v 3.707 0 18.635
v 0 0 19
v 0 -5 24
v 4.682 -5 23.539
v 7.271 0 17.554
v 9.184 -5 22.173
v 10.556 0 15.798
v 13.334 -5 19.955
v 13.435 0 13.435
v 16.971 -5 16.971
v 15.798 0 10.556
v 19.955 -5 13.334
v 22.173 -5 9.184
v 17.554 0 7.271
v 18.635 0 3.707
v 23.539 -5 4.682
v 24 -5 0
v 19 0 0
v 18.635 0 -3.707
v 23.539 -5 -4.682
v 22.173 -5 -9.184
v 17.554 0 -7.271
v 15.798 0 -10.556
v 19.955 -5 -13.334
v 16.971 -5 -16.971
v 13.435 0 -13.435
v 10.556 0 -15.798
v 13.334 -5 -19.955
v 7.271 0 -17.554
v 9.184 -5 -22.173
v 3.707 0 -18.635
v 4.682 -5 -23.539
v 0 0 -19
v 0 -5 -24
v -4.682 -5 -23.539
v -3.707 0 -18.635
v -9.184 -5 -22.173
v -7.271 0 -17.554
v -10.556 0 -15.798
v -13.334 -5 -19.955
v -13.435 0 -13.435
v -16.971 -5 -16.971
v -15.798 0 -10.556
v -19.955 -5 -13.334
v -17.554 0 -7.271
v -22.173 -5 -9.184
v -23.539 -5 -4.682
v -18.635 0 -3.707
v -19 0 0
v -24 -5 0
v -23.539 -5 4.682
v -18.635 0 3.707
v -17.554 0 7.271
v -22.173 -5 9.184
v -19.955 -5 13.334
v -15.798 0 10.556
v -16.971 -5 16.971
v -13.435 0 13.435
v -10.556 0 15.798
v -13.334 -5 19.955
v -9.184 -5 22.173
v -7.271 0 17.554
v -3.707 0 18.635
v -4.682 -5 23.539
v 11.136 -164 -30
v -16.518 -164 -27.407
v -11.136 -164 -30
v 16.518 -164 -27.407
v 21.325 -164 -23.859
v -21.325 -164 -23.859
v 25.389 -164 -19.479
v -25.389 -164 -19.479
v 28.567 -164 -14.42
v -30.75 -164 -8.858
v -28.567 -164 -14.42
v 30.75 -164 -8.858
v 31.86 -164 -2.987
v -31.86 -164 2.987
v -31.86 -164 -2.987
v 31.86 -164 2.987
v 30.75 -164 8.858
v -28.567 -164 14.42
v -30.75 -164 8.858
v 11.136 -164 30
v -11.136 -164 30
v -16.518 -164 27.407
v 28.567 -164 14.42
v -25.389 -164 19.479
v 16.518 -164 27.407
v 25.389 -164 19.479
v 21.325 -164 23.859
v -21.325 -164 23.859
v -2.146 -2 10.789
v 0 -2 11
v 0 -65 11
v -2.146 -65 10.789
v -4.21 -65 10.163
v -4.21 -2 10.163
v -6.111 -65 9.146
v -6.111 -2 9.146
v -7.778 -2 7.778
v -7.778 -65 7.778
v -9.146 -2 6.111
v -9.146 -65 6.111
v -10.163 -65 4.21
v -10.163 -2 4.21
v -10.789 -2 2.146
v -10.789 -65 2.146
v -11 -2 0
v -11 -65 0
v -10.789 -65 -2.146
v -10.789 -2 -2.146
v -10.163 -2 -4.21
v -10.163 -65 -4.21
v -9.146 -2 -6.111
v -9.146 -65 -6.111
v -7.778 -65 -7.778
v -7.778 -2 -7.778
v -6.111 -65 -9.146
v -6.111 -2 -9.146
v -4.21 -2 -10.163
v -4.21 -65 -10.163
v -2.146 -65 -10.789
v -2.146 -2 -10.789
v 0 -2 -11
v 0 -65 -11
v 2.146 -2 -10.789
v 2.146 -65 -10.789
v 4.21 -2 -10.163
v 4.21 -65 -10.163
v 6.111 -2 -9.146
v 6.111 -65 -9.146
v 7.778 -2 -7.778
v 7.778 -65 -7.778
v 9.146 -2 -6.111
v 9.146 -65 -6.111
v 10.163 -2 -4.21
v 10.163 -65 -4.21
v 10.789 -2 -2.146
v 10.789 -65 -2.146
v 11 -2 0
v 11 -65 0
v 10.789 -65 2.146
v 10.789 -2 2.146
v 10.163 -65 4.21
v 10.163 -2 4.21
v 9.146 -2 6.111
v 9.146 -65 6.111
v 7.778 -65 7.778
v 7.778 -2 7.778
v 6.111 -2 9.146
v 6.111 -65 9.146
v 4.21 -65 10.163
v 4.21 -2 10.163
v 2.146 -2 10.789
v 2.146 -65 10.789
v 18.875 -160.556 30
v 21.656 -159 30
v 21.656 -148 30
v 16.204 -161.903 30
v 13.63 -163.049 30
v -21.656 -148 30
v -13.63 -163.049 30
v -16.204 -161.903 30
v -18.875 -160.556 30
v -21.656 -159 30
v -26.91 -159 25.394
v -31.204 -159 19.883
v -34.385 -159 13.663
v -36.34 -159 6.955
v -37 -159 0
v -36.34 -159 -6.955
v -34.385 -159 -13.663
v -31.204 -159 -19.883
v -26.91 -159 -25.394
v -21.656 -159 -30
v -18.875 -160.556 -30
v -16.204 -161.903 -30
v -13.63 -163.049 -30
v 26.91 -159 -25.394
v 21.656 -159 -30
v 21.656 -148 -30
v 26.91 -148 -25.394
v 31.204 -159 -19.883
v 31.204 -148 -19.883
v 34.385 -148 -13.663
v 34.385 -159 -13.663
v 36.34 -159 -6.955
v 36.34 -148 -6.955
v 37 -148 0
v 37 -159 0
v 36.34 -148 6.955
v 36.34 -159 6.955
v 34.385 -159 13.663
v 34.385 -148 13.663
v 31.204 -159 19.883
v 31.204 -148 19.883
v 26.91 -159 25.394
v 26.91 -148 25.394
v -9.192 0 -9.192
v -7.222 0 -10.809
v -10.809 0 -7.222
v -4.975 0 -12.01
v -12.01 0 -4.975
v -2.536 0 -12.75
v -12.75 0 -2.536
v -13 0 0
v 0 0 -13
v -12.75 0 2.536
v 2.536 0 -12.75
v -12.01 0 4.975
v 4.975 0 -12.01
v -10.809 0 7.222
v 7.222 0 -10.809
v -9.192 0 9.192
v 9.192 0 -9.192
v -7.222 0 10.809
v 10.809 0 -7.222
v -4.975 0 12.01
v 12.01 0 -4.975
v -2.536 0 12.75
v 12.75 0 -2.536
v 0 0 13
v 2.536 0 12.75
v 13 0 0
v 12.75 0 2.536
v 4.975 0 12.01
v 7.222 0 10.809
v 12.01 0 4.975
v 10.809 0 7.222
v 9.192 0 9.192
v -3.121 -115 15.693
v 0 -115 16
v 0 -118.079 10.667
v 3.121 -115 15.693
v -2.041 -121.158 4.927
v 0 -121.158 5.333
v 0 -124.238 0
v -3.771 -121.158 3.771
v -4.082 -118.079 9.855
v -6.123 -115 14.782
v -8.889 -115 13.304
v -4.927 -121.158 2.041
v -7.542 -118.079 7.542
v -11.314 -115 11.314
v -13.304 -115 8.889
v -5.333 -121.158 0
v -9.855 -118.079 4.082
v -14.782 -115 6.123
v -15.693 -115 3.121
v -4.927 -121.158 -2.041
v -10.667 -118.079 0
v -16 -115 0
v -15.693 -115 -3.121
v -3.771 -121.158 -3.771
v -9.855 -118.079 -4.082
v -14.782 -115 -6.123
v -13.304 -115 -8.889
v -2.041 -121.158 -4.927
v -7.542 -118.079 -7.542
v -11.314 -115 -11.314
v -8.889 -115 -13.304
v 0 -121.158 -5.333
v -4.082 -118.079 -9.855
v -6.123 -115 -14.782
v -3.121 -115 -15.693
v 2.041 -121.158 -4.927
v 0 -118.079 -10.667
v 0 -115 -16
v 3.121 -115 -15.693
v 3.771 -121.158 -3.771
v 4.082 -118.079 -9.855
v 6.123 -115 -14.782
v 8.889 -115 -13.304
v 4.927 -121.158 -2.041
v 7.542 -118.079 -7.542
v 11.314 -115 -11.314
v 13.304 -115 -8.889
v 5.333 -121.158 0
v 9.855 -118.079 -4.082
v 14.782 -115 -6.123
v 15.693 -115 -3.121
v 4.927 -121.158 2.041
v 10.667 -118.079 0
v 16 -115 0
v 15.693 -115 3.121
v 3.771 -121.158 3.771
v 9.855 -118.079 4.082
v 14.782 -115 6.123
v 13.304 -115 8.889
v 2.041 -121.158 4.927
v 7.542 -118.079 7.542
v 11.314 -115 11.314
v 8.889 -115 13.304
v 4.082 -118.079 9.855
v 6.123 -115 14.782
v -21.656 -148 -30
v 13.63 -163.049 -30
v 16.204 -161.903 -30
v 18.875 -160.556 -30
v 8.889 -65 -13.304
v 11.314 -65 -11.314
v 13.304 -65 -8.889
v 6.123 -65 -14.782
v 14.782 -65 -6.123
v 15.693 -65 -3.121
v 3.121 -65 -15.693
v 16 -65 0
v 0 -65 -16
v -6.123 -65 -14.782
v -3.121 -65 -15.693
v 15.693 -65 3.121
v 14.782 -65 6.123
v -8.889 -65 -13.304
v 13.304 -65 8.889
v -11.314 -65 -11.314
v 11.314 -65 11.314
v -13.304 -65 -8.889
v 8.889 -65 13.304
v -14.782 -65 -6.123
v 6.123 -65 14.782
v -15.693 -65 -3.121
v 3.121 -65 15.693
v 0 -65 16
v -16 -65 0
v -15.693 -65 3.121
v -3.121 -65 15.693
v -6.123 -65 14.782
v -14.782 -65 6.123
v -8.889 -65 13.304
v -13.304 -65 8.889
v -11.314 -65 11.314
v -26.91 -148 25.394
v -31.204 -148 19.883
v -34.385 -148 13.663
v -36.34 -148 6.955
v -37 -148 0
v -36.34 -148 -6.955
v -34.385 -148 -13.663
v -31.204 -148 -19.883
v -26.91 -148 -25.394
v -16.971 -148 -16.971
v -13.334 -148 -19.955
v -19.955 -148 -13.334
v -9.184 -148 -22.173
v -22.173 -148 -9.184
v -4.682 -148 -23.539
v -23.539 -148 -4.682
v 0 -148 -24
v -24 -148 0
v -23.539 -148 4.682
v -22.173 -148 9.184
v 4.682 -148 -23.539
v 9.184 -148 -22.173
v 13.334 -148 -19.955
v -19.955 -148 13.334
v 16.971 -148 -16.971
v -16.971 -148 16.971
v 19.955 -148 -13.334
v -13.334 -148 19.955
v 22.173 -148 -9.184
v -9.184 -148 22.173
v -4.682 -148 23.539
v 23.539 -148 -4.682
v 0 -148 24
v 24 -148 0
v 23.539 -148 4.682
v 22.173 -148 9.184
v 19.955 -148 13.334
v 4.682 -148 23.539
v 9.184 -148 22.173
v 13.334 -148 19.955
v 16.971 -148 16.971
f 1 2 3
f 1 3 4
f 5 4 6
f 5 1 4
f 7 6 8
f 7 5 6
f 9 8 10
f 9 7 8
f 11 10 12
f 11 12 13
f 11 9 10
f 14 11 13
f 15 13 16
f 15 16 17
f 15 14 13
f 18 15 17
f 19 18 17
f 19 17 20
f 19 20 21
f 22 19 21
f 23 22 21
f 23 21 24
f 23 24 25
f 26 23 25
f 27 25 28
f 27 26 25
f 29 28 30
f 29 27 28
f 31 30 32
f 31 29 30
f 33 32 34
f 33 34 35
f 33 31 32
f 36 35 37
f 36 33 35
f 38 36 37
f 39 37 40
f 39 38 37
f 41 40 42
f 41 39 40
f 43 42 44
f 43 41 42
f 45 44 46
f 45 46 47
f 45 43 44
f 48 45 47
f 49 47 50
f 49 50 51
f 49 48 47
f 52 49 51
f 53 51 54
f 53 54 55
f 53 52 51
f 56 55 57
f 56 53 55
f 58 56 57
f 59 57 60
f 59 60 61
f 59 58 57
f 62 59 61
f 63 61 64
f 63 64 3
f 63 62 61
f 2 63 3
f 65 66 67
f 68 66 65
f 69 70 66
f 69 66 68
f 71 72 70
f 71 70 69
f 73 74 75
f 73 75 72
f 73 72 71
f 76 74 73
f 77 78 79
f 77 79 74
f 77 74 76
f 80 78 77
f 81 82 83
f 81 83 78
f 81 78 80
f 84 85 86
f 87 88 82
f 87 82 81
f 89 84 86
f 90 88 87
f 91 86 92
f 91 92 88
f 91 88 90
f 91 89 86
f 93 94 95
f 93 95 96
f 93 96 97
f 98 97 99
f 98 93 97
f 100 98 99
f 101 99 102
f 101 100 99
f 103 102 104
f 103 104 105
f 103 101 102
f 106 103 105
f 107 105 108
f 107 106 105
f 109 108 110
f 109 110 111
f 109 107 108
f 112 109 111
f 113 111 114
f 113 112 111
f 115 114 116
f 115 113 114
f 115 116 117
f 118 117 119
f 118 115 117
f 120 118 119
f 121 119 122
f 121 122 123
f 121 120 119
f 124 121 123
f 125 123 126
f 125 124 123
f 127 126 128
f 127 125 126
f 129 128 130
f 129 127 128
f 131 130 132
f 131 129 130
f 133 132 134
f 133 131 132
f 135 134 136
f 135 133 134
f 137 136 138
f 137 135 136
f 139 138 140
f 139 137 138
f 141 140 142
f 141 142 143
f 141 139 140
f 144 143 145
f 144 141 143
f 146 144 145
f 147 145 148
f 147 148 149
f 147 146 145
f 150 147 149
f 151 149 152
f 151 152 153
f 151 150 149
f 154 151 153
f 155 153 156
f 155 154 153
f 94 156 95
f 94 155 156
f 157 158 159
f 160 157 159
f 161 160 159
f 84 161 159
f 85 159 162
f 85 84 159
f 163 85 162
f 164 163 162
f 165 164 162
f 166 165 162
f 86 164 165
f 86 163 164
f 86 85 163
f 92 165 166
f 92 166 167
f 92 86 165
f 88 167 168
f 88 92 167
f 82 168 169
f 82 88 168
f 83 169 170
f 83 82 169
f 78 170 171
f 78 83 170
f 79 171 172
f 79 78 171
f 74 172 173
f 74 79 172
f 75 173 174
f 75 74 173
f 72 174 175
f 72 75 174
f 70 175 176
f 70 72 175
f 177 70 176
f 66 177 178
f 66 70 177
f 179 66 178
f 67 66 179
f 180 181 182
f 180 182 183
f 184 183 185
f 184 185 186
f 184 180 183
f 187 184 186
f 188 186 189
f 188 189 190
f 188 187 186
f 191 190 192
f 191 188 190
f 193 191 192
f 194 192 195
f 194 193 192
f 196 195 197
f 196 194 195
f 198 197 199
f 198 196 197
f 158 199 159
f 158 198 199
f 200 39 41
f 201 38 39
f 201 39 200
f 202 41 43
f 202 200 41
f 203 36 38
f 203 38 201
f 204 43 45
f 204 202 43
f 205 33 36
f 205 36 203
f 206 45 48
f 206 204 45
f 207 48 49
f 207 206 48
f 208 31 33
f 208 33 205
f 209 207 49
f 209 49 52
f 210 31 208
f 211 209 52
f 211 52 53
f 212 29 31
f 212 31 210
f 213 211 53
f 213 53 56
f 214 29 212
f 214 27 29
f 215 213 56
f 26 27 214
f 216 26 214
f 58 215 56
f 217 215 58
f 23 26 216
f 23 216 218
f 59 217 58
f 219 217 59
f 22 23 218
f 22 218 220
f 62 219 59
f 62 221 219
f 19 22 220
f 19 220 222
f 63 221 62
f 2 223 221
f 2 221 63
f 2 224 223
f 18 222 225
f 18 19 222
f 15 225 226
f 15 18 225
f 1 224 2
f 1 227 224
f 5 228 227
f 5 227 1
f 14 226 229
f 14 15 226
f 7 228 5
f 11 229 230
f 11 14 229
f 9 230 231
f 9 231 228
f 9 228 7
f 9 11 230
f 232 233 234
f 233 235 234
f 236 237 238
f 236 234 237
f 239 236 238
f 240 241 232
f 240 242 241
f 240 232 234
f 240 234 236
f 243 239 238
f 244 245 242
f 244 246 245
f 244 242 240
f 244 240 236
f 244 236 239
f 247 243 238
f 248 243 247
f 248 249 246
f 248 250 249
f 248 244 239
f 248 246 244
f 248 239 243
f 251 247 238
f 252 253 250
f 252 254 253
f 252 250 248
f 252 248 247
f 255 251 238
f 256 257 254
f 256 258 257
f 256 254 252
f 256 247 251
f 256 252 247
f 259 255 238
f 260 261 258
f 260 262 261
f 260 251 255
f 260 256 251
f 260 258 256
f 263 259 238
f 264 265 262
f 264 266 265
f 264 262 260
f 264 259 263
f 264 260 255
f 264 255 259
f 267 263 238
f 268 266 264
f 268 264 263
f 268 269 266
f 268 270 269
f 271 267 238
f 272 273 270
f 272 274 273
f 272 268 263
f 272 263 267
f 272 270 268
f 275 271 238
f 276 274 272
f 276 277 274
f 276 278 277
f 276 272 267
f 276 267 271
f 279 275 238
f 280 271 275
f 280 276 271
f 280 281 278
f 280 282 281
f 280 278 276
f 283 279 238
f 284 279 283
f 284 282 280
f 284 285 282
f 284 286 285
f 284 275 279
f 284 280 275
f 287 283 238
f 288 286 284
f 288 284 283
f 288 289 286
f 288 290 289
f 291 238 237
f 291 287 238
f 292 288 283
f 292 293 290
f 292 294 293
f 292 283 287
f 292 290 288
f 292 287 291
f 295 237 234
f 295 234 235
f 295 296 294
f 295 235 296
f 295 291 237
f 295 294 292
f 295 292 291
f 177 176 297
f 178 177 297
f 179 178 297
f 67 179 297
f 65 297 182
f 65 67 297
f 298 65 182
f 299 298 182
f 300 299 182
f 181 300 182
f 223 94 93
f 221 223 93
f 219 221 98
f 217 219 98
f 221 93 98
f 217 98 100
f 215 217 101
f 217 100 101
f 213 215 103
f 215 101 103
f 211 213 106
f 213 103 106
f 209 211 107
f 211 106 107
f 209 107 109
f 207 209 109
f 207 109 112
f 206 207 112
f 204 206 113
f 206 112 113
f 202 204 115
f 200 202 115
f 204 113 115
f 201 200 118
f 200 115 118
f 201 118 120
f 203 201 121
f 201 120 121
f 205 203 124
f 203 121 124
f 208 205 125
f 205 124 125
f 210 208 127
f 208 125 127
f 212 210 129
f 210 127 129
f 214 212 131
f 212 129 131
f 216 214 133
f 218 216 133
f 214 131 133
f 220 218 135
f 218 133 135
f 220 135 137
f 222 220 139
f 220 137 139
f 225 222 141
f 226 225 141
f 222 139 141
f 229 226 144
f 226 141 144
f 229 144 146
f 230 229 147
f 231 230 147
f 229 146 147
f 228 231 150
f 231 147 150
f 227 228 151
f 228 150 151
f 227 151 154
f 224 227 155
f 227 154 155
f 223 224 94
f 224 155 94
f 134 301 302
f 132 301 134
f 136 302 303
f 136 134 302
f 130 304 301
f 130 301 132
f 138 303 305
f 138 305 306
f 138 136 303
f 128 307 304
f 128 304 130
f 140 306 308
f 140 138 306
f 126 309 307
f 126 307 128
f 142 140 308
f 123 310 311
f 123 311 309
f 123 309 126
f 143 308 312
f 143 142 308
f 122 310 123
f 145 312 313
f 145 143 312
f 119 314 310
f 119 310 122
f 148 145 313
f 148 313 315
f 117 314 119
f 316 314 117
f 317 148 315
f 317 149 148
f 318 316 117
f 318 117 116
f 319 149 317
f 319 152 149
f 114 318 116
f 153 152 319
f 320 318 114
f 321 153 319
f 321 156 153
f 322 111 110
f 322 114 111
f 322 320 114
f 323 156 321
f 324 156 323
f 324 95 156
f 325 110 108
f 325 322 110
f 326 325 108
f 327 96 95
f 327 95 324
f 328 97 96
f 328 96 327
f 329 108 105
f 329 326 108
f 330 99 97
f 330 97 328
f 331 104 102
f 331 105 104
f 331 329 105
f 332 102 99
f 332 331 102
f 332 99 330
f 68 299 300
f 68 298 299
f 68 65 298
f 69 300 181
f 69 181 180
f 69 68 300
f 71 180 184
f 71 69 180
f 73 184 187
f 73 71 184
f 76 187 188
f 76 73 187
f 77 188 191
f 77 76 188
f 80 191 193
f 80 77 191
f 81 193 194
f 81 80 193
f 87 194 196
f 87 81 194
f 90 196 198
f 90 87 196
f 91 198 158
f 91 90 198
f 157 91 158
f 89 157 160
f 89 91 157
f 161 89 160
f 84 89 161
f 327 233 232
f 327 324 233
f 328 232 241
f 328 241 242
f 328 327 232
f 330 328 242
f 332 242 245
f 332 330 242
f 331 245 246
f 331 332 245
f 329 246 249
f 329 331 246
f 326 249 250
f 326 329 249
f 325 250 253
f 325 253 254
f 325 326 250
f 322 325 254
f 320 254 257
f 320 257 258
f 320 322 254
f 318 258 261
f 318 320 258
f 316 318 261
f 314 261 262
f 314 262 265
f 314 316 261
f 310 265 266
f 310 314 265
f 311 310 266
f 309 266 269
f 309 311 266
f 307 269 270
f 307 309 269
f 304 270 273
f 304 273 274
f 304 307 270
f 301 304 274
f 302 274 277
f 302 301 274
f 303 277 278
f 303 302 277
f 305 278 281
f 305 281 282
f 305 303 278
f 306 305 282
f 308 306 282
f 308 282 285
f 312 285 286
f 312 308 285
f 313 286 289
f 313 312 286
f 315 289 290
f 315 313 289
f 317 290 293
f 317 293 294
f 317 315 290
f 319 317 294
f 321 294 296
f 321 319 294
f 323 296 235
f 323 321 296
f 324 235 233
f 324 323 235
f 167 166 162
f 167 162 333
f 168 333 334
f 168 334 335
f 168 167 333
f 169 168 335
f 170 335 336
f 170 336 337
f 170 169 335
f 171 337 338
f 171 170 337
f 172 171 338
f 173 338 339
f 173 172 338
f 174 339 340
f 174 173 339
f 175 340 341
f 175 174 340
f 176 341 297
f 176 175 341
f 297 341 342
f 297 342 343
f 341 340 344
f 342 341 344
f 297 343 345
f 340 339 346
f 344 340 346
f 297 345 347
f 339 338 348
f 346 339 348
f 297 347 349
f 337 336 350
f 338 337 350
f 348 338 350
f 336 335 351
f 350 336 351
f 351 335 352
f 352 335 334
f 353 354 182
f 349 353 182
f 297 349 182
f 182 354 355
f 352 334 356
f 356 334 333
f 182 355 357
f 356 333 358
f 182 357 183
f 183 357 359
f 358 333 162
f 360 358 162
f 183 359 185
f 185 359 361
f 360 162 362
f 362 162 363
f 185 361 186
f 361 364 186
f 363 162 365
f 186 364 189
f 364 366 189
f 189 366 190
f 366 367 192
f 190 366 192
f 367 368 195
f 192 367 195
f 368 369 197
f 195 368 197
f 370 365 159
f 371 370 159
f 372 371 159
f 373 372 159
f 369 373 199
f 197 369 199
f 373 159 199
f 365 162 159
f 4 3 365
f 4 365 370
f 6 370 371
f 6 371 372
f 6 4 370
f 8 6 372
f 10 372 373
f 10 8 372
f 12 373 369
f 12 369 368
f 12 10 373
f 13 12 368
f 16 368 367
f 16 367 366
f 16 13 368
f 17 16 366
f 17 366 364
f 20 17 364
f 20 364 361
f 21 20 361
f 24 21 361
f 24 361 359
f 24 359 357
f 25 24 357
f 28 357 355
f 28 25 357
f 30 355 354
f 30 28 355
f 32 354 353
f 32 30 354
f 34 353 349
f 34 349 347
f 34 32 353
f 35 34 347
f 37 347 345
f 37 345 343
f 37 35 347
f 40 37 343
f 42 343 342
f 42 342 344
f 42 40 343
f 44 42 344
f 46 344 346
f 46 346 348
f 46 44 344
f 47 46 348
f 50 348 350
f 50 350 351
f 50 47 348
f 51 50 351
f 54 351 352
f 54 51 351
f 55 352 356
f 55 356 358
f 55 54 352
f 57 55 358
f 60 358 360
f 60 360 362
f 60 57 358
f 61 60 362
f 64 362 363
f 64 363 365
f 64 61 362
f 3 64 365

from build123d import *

# Parameters (mm, degrees)
EXTRUDE_1_DEPTH = 16
SKETCH_2_W      = 24
SKETCH_2_H      = 148
CHAMFER_1_SIZE  = 5
CHAMFER_2_SIZE  = 2


with BuildPart() as part:
    # Эскиз1 → Бобышка-Вытянуть1 (new body)
    with BuildSketch(Plane.XZ.offset(164)):
        with BuildLine():
            Line((21.656407828, 30), (-21.656407828, 30))
            ThreePointArc((-21.656407828, 30), (-37, 0), (-21.656407828, -30))
            Line((-21.656407828, -30), (21.656407828, -30))
            ThreePointArc((21.656407828, -30), (37, 0), (21.656407828, 30))
        make_face()
    extrude(amount=-EXTRUDE_1_DEPTH)

    # Эскиз2 → Повернуть1 (revolve)
    with BuildSketch(Plane(origin=(0, 0, 0), x_dir=(-1, 0, 0), z_dir=(0, 0, -1)), mode=Mode.PRIVATE) as revolve_1_sk:
        with Locations((-12, -74)):
            Rectangle(SKETCH_2_W, SKETCH_2_H)
    revolve(revolve_1_sk.sketch.rotate(Axis((0, -148, 0), (0, 1, 0)), 270), axis=Axis((0, -148, 0), (0, 1, 0)))

    # Эскиз3 → Цековка для  болта с шестигранной головкой M301 (revolve, cut)
    with BuildSketch(Plane(origin=(0, 0, 0), x_dir=(0, 0, 1), z_dir=(1, 0, 0))):
        Polygon((0, 0), (0, 124.237604307), (16, 115), (16, 65), (11, 65), (11, 0), align=None)
    revolve(axis=Axis((0, 6.35, 0), (0, -1, 0)), mode=Mode.SUBTRACT)

    # Фаска1
    chamfer_1_edges = [part.edges().sort_by_distance(p)[0] for p in [
        (0, 0, -24),
        (-37, -164, 0),
        (37, -164, 0),
    ]]
    chamfer(chamfer_1_edges, length=CHAMFER_1_SIZE)

    # Фаска2
    chamfer_2_edges = [part.edges().sort_by_distance(p)[0] for p in [
        (0, 0, -11),
    ]]
    chamfer(chamfer_2_edges, length=CHAMFER_2_SIZE)


solid = part.part
